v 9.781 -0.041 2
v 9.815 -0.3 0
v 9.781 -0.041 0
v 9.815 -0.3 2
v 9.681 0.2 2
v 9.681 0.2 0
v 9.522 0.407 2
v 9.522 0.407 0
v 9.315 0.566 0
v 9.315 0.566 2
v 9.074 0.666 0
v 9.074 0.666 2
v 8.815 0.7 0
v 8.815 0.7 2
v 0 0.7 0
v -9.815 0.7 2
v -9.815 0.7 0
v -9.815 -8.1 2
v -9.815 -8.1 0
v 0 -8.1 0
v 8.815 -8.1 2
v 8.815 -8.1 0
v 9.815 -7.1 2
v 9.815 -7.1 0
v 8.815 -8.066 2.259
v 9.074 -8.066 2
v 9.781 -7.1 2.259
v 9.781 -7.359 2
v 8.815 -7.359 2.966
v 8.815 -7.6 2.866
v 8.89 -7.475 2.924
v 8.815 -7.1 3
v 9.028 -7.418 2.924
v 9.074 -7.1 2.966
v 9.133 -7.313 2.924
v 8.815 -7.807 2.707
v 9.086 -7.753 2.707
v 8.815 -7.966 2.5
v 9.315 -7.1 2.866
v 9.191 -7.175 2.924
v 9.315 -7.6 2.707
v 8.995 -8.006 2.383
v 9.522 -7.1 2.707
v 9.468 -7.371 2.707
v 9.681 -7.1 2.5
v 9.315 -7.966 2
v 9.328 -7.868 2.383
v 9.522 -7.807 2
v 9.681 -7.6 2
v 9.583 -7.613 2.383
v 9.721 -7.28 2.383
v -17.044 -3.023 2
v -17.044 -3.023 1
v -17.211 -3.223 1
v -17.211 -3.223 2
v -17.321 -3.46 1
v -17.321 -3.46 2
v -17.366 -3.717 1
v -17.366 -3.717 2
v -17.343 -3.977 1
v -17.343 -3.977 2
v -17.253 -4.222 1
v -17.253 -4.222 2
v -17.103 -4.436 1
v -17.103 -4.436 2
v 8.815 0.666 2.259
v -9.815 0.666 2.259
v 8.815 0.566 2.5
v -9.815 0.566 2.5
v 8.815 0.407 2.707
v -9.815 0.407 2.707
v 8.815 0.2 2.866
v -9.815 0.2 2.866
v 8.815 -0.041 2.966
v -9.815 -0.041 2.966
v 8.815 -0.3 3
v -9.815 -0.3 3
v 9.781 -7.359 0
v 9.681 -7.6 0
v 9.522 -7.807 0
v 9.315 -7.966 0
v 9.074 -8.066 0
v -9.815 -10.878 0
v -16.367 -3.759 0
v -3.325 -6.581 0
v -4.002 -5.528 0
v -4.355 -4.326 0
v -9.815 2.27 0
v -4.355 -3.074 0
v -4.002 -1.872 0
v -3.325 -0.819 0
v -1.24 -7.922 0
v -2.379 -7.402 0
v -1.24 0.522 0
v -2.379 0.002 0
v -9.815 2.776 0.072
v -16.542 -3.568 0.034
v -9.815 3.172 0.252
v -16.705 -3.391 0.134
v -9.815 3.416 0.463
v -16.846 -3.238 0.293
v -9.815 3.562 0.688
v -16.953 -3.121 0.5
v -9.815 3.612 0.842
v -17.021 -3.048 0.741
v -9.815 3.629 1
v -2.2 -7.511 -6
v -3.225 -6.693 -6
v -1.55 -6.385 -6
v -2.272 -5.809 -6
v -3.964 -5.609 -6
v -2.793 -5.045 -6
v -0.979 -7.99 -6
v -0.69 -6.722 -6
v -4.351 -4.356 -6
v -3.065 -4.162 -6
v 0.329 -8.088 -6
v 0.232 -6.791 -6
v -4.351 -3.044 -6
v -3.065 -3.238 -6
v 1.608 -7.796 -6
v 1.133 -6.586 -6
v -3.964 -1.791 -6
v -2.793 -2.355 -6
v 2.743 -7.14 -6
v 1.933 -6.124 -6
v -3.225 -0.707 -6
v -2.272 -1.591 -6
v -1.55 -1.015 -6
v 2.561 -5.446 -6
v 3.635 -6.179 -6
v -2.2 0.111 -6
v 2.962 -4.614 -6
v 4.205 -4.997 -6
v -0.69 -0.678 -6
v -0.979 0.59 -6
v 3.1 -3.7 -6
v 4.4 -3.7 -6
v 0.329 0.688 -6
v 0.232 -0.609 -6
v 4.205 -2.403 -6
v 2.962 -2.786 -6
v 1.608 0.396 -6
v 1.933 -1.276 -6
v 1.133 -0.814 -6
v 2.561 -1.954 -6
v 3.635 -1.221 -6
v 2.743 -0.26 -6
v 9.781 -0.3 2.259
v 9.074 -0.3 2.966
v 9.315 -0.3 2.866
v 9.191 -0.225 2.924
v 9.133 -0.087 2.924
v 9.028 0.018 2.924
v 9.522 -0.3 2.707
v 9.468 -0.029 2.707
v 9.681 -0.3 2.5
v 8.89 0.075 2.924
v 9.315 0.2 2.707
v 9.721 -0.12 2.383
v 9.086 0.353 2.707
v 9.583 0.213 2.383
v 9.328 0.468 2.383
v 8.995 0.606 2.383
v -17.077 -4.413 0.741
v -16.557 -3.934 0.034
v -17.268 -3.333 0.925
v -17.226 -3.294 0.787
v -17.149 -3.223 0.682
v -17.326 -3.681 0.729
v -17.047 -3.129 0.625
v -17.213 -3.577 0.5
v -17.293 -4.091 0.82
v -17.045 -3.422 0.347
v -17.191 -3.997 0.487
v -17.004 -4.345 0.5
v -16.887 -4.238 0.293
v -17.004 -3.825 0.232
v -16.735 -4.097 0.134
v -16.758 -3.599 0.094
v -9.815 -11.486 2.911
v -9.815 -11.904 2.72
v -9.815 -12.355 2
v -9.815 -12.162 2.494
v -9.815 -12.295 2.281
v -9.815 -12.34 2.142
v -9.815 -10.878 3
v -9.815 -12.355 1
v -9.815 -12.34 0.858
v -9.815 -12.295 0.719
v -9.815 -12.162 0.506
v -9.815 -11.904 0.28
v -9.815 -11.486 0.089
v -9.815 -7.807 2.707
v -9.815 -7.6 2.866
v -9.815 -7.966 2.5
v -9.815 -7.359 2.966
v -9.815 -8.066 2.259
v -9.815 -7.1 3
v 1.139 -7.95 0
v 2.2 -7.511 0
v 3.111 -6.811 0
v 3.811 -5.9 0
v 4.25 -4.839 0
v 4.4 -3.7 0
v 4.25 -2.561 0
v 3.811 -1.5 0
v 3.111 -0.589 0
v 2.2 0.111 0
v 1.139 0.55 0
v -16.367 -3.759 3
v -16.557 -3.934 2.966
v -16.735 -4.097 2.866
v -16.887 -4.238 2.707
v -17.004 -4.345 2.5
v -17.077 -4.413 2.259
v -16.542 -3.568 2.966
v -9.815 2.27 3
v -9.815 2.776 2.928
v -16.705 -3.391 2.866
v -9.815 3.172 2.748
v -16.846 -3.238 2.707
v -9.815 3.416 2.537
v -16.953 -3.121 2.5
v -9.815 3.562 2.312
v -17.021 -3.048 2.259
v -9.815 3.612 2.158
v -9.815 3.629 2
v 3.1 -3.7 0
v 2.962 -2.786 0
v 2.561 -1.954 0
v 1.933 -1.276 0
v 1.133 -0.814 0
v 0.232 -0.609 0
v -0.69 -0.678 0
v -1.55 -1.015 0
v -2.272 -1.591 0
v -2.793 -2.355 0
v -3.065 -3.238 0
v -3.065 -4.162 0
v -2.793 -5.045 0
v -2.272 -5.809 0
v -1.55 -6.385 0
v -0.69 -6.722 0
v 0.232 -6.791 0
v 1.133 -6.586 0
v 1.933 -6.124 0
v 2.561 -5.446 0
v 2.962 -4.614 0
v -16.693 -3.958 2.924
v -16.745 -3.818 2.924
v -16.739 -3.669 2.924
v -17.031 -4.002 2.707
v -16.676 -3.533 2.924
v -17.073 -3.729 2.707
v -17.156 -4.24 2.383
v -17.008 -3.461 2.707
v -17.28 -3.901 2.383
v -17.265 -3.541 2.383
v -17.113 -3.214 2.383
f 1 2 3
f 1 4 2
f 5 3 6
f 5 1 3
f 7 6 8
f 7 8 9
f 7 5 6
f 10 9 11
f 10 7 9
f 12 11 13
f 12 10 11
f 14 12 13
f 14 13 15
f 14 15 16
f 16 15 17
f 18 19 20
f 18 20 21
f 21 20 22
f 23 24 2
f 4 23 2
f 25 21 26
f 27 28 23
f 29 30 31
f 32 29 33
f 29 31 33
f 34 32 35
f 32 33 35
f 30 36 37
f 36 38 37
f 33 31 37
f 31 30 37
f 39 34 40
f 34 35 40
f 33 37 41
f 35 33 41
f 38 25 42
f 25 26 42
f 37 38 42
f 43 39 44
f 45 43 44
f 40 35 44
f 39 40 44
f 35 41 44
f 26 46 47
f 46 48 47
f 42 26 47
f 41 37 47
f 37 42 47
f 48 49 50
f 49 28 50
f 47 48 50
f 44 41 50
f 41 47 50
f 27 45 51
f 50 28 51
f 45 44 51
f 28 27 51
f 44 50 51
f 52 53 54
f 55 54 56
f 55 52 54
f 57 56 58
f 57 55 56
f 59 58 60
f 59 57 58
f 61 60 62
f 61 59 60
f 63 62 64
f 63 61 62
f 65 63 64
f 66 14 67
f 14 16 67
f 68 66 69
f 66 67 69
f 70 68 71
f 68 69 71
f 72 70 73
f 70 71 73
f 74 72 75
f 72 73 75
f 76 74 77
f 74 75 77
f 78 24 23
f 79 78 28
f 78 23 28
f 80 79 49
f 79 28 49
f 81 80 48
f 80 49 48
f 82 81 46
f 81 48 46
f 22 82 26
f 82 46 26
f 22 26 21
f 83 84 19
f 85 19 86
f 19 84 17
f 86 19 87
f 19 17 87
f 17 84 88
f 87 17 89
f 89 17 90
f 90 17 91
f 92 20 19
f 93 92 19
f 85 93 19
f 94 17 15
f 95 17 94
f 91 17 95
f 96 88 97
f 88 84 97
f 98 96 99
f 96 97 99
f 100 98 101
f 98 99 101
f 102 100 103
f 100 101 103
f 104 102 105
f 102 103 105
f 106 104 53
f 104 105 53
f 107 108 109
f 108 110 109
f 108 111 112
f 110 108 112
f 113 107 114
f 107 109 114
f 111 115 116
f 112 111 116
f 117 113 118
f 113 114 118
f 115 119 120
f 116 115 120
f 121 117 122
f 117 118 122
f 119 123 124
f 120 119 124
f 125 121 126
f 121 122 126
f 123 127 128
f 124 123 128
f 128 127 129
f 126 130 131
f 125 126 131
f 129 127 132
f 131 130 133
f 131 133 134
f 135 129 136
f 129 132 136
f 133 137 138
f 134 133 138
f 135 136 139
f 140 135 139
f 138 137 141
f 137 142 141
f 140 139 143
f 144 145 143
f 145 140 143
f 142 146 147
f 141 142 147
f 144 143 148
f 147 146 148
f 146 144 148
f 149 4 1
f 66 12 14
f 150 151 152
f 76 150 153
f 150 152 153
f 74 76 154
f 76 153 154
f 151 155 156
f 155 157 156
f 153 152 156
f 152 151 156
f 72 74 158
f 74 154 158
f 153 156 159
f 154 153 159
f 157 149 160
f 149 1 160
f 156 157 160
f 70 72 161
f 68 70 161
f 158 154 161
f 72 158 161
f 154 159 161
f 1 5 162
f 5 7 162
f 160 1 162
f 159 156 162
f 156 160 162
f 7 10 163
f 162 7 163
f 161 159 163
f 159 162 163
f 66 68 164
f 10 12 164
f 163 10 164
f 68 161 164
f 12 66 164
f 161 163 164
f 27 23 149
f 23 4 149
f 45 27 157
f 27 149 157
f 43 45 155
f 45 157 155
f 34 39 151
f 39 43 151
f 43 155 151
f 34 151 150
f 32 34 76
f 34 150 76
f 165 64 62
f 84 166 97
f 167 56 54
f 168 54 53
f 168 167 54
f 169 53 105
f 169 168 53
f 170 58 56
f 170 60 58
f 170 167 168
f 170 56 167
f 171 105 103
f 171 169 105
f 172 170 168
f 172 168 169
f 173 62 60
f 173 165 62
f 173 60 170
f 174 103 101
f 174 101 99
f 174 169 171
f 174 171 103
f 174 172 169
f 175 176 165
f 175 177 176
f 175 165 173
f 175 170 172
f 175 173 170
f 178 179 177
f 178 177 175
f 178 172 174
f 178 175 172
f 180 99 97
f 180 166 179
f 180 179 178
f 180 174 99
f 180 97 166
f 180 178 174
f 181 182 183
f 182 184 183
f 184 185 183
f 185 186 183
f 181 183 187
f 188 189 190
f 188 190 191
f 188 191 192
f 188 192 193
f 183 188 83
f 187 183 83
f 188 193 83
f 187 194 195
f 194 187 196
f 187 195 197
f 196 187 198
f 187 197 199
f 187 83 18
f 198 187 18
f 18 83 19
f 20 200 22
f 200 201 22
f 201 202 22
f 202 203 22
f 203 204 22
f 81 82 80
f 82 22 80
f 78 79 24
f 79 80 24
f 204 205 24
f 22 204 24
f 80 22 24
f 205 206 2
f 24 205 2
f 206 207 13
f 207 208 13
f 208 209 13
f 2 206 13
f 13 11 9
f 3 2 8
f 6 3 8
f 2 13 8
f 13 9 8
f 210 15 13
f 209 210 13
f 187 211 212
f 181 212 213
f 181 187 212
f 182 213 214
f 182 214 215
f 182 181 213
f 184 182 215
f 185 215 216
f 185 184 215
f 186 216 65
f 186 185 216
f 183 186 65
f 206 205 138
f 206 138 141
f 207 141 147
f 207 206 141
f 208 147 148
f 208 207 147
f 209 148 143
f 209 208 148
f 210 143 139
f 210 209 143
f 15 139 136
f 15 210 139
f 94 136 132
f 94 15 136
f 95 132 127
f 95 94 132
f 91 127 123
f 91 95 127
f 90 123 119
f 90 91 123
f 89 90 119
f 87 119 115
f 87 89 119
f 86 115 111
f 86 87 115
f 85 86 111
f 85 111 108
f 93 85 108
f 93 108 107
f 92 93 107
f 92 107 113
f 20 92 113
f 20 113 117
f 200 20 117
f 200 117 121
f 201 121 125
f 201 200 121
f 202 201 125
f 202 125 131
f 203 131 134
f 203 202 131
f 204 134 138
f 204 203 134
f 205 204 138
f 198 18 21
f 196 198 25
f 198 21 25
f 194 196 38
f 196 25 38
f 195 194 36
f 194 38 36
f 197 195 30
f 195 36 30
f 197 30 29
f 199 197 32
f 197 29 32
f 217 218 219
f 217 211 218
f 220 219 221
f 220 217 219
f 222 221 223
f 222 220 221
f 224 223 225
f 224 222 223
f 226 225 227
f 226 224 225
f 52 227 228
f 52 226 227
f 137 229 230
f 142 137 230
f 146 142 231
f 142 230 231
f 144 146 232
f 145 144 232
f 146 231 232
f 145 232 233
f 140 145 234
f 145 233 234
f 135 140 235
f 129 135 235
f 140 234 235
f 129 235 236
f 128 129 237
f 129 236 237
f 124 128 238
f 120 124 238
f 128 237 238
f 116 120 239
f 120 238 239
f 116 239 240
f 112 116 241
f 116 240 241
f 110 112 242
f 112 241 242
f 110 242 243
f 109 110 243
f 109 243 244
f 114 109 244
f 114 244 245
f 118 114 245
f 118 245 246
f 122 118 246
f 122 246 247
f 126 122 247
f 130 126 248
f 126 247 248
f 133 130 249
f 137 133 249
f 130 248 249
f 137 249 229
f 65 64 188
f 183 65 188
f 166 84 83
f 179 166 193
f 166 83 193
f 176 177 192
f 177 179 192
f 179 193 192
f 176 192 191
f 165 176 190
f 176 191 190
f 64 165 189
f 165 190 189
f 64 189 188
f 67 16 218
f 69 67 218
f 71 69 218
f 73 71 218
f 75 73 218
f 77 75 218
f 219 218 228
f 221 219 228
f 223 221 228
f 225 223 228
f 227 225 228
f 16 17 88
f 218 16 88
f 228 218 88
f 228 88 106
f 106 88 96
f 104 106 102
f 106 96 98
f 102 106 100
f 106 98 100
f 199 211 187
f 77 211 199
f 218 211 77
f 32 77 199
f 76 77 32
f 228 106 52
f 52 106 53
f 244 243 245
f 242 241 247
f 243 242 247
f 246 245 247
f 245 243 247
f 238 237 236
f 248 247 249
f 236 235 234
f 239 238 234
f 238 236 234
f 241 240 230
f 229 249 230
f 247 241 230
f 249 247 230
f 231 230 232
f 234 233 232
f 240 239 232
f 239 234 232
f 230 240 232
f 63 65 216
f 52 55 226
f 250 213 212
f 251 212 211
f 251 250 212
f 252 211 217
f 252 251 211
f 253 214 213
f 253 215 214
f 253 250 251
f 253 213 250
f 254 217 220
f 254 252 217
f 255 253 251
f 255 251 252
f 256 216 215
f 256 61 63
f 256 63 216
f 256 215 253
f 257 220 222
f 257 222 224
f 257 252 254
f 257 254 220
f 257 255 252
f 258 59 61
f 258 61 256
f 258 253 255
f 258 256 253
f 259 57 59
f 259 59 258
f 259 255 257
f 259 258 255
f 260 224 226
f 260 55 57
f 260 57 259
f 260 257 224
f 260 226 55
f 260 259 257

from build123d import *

# Parameters (mm, degrees)
SKETCH1_R           = 4.4
SKETCH1_R_2         = 3.1
BOSS_EXTRUDE1_DEPTH = 6
BOSS_EXTRUDE2_DEPTH = 3
FILLET1_R           = 1


with BuildPart() as part:
    # Sketch1 → Boss-Extrude1 (new body)
    with BuildSketch(Plane.XY):
        with Locations((0, -3.7)):
            Circle(SKETCH1_R)
        with Locations((0, -3.7)):
            Circle(SKETCH1_R_2, mode=Mode.SUBTRACT)
    extrude(amount=-BOSS_EXTRUDE1_DEPTH)

    # Sketch2 → Boss-Extrude2 (add)
    with BuildSketch(Plane.XY):
        Polygon((9.815203288, -8.1), (9.815203288, 0.7), (-9.815203288, 0.7), (-9.815203288, 3.629197365), (-17.779678307, -3.7), (-9.815203288, -12.354817051), (-9.815203288, -8.1), align=None)
    extrude(amount=BOSS_EXTRUDE2_DEPTH)

    # Fillet1
    fillet1_edges = [part.edges().sort_by_distance(p)[0] for p in [
        (-13.797440798, -8.027408526, 0),
        (-17.779678307, -3.7, 1.5),
        (9.815203288, -8.1, 1.5),
        (9.815203288, 0.7, 1.5),
        (-13.797440798, -0.035401317, 0),
        (-13.797440798, -8.027408526, 3),
        (0, -8.1, 3),
        (9.815203288, -3.7, 3),
        (0, 0.7, 3),
        (-13.797440798, -0.035401317, 3),
    ]]
    fillet(fillet1_edges, radius=FILLET1_R)


solid = part.part
